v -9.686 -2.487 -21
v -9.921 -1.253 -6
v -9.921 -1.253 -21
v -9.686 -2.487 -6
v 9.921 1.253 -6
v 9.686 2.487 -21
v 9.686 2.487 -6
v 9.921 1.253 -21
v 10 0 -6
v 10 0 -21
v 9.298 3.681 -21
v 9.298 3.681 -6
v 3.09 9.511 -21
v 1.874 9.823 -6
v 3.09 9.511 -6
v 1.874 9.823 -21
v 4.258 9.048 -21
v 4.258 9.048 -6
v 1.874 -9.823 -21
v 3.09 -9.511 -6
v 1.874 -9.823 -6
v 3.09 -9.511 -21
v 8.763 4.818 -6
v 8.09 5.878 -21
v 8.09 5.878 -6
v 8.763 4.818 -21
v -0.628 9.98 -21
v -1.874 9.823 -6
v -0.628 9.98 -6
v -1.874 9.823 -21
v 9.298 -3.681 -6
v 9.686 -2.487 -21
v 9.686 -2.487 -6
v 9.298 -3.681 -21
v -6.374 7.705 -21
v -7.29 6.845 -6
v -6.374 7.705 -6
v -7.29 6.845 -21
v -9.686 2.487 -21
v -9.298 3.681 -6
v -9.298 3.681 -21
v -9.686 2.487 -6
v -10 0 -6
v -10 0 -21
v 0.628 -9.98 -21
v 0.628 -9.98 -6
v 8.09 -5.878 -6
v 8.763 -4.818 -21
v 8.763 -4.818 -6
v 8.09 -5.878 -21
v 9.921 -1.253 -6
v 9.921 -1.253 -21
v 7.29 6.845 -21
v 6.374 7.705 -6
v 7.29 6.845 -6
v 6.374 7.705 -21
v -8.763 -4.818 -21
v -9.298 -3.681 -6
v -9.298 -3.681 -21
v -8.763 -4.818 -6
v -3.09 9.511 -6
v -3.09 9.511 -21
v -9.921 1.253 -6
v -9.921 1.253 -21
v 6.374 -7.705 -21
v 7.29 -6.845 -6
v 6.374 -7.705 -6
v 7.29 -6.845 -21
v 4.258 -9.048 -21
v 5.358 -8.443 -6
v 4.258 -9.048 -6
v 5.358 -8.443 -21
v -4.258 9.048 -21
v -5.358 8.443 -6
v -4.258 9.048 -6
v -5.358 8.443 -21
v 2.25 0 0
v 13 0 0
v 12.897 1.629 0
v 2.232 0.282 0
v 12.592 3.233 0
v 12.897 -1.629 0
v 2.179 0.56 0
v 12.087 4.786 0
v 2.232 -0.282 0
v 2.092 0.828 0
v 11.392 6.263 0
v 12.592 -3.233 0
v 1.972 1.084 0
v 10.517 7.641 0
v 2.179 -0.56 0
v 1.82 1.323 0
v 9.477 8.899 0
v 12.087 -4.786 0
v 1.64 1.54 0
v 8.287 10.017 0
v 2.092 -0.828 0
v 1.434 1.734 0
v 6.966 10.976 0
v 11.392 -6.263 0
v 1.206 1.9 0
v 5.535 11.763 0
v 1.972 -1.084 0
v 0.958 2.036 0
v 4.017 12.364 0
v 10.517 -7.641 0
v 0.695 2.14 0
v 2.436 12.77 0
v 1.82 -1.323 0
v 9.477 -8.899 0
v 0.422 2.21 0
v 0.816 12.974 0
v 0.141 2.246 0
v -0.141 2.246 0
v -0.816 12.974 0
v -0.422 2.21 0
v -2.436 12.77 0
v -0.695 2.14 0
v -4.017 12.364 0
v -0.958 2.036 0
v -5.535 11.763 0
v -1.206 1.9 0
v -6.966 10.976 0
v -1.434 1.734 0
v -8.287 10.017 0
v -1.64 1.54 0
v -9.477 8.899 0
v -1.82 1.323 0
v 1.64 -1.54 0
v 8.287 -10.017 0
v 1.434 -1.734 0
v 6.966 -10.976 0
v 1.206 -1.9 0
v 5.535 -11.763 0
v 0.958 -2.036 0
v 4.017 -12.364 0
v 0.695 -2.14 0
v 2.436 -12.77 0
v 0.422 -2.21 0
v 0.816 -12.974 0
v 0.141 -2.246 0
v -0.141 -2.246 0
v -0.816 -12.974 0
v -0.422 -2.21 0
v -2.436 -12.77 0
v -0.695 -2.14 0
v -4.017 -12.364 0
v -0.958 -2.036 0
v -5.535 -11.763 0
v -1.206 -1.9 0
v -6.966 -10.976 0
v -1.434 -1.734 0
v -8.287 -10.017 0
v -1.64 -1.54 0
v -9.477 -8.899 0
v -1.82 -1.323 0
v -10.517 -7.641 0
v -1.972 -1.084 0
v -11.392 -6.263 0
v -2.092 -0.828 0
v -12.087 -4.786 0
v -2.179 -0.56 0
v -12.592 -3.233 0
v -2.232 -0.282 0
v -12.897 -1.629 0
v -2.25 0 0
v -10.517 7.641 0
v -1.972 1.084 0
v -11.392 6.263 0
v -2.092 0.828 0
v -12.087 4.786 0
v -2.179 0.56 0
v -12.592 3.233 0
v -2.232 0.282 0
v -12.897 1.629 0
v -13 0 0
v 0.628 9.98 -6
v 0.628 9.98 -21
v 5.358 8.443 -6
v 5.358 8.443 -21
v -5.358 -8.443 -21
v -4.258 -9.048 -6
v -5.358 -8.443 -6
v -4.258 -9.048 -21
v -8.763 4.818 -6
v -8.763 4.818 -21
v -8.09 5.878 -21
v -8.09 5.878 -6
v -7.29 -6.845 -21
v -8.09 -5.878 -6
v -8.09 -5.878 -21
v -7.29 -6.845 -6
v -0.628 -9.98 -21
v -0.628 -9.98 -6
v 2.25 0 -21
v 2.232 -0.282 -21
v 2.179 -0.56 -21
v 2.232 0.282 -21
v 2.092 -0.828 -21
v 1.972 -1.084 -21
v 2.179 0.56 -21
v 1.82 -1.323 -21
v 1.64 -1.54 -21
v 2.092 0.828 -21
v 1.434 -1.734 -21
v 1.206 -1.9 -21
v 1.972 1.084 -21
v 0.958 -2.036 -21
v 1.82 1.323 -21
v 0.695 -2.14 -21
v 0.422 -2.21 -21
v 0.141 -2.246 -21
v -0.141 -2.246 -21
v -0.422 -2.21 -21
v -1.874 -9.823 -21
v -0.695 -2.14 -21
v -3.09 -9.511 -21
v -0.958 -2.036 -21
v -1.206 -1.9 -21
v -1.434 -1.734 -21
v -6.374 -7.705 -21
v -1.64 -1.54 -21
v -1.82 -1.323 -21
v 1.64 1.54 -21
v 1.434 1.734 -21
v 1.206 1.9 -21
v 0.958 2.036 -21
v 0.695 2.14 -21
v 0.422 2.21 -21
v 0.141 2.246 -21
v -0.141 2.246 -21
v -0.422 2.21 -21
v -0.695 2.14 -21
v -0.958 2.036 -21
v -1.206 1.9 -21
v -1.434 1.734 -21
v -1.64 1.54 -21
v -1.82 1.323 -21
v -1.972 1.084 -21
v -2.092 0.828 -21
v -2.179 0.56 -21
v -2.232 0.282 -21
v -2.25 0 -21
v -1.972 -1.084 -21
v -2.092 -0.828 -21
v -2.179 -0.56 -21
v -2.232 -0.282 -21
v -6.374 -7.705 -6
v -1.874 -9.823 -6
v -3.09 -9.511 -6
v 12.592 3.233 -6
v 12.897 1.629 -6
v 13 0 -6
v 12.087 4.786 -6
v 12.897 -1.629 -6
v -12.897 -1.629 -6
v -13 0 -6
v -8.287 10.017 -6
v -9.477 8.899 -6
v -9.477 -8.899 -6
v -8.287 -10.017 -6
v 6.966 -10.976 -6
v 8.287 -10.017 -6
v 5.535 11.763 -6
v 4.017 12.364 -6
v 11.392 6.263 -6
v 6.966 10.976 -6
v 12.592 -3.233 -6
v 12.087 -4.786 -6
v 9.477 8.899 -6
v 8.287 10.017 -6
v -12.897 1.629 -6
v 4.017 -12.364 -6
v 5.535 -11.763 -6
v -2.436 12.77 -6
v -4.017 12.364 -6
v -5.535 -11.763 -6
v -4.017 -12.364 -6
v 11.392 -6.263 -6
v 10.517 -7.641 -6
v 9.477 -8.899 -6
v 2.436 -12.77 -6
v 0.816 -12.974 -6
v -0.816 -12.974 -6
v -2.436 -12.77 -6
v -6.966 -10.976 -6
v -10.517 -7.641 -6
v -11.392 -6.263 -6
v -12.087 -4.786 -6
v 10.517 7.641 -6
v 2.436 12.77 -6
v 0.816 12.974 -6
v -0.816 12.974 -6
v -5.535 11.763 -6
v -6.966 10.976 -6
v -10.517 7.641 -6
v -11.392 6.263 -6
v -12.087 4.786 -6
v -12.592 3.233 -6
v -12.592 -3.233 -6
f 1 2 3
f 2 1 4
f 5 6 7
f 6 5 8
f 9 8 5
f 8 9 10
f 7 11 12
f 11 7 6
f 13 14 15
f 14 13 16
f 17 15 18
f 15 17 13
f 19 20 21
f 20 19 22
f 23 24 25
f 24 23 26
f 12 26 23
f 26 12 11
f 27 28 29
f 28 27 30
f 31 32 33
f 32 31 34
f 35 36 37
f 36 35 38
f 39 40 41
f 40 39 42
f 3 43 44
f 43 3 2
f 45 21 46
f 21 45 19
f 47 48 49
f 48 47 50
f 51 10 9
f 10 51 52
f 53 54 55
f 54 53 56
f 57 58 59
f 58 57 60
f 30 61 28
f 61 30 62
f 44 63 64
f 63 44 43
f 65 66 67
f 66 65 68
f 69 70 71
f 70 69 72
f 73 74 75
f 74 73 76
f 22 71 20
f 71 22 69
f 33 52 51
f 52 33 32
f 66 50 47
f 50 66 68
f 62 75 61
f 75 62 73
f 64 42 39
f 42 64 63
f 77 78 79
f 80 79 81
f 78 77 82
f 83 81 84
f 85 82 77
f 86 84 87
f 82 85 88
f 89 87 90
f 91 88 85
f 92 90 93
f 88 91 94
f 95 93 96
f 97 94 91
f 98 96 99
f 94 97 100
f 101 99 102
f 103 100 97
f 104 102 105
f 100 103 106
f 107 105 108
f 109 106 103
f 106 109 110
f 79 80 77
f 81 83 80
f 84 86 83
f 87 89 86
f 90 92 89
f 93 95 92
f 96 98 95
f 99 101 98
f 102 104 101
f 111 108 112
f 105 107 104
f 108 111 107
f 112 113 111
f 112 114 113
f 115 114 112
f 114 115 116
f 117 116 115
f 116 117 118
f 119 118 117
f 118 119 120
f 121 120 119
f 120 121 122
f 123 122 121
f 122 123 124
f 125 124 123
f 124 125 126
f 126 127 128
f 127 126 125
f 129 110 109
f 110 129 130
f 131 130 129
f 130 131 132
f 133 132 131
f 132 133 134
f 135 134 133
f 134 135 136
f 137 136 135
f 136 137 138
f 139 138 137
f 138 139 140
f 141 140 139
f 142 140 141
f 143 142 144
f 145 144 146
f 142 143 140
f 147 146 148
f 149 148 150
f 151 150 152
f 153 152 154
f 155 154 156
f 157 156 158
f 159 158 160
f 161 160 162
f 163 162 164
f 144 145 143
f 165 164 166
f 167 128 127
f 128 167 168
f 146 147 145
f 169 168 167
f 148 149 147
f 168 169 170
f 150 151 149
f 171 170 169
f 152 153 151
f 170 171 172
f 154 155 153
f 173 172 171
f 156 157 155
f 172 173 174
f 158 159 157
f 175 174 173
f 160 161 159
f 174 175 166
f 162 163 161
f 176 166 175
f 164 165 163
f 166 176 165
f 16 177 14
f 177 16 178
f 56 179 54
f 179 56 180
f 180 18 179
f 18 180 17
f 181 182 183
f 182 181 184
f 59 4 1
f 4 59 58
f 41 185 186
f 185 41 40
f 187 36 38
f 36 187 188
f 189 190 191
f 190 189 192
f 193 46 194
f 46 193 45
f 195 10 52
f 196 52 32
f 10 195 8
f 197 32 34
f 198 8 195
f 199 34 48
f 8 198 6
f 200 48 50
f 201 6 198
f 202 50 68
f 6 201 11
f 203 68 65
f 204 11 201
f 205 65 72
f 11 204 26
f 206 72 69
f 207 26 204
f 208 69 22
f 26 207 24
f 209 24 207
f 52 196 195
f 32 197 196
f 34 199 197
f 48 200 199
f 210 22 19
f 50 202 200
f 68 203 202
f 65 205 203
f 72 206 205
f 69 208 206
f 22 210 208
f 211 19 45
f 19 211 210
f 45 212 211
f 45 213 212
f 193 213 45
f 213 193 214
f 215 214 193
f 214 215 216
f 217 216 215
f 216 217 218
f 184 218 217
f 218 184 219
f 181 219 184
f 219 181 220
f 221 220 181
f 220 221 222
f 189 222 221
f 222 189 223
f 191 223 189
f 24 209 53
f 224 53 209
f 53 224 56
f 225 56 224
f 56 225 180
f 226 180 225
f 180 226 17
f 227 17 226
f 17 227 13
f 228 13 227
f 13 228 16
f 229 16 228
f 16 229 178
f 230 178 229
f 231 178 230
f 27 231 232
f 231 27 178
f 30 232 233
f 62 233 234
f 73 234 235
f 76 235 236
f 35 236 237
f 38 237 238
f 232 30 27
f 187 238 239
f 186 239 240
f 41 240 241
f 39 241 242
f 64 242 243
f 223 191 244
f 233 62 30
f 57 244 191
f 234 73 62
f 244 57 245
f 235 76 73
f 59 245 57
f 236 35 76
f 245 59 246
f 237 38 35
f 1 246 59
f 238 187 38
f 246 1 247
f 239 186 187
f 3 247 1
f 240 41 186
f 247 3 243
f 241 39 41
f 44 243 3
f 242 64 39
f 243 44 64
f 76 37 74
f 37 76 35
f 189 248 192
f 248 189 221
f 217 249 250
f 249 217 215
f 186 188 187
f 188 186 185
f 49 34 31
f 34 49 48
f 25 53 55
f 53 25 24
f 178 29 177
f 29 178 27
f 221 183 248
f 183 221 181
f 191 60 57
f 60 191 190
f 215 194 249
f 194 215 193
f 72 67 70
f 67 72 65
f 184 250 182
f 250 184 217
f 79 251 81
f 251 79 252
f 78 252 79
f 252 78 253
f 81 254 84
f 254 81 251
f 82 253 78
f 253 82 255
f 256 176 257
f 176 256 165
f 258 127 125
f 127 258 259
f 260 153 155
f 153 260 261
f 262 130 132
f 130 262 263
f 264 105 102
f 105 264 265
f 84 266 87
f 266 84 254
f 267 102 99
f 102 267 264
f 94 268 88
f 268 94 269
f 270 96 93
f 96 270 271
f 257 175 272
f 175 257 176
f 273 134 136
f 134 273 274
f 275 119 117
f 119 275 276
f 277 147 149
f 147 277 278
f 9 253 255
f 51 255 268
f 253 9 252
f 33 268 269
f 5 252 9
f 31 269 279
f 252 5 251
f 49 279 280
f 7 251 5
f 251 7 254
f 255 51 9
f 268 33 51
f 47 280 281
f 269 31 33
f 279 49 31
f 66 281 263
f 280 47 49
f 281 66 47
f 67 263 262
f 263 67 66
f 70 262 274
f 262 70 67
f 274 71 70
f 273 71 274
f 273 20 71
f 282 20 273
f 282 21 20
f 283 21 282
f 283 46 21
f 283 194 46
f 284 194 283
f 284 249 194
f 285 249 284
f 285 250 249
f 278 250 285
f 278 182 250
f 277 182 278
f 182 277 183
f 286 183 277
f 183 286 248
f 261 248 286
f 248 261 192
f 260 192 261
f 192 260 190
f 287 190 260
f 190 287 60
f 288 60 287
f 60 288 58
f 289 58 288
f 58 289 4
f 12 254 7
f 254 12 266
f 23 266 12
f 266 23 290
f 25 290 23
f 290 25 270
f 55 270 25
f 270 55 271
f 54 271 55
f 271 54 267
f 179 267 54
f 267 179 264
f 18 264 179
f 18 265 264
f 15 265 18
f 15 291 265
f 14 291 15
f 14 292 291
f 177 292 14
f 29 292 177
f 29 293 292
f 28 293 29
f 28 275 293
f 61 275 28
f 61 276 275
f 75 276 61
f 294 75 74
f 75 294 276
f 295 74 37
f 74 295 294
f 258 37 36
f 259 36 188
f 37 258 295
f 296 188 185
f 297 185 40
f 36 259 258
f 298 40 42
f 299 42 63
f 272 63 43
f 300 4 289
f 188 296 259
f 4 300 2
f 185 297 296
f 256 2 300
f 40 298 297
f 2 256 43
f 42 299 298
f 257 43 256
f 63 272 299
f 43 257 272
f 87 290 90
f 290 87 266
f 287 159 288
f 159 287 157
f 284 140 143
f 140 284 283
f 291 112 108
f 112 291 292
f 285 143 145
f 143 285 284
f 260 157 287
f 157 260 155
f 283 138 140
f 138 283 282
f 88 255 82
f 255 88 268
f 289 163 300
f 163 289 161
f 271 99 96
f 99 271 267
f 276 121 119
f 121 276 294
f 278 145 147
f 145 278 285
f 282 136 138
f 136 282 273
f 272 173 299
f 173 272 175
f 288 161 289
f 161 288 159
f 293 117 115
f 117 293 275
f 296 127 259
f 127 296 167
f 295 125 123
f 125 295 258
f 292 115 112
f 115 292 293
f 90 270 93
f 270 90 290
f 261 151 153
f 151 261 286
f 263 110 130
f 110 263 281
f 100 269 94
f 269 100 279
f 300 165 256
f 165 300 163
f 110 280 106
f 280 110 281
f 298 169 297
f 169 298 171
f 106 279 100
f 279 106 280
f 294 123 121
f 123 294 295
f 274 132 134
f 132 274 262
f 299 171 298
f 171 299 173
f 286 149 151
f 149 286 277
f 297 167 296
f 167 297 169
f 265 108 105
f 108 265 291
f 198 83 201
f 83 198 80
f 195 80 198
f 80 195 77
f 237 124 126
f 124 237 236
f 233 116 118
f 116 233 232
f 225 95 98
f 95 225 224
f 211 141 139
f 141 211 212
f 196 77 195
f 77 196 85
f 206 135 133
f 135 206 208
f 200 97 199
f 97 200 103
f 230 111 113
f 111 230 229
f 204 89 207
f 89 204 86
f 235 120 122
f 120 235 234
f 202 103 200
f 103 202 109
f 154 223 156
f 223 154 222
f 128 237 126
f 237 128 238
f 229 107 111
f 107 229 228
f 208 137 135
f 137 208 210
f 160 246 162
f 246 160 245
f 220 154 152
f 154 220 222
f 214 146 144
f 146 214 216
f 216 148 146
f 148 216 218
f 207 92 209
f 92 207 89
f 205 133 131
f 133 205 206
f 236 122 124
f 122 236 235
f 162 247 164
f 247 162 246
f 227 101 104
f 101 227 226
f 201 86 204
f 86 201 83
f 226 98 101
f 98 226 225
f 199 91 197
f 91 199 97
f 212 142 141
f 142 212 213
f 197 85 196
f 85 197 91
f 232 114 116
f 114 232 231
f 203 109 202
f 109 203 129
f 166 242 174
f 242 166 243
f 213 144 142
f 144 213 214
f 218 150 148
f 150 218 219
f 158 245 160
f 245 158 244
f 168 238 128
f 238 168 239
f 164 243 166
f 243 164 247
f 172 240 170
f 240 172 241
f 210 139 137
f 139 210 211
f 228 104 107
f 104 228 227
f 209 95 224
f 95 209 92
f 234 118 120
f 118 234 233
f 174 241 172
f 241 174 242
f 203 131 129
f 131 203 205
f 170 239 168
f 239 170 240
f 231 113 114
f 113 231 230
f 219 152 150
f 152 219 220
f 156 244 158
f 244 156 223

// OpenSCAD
$fn = 50;


difference() {
	union() {
		translate(v = [0, 0, -21.0000000000]) {
			cylinder(h = 21, r = 10.0000000000);
		}
		translate(v = [0, 0, -6.0000000000]) {
			cylinder(h = 6, r = 13.0000000000);
		}
	}
	union() {
		#translate(v = [0, 0, -21]) {
			cylinder(h = 21, r = 2.2500000000);
		}
	}
}
